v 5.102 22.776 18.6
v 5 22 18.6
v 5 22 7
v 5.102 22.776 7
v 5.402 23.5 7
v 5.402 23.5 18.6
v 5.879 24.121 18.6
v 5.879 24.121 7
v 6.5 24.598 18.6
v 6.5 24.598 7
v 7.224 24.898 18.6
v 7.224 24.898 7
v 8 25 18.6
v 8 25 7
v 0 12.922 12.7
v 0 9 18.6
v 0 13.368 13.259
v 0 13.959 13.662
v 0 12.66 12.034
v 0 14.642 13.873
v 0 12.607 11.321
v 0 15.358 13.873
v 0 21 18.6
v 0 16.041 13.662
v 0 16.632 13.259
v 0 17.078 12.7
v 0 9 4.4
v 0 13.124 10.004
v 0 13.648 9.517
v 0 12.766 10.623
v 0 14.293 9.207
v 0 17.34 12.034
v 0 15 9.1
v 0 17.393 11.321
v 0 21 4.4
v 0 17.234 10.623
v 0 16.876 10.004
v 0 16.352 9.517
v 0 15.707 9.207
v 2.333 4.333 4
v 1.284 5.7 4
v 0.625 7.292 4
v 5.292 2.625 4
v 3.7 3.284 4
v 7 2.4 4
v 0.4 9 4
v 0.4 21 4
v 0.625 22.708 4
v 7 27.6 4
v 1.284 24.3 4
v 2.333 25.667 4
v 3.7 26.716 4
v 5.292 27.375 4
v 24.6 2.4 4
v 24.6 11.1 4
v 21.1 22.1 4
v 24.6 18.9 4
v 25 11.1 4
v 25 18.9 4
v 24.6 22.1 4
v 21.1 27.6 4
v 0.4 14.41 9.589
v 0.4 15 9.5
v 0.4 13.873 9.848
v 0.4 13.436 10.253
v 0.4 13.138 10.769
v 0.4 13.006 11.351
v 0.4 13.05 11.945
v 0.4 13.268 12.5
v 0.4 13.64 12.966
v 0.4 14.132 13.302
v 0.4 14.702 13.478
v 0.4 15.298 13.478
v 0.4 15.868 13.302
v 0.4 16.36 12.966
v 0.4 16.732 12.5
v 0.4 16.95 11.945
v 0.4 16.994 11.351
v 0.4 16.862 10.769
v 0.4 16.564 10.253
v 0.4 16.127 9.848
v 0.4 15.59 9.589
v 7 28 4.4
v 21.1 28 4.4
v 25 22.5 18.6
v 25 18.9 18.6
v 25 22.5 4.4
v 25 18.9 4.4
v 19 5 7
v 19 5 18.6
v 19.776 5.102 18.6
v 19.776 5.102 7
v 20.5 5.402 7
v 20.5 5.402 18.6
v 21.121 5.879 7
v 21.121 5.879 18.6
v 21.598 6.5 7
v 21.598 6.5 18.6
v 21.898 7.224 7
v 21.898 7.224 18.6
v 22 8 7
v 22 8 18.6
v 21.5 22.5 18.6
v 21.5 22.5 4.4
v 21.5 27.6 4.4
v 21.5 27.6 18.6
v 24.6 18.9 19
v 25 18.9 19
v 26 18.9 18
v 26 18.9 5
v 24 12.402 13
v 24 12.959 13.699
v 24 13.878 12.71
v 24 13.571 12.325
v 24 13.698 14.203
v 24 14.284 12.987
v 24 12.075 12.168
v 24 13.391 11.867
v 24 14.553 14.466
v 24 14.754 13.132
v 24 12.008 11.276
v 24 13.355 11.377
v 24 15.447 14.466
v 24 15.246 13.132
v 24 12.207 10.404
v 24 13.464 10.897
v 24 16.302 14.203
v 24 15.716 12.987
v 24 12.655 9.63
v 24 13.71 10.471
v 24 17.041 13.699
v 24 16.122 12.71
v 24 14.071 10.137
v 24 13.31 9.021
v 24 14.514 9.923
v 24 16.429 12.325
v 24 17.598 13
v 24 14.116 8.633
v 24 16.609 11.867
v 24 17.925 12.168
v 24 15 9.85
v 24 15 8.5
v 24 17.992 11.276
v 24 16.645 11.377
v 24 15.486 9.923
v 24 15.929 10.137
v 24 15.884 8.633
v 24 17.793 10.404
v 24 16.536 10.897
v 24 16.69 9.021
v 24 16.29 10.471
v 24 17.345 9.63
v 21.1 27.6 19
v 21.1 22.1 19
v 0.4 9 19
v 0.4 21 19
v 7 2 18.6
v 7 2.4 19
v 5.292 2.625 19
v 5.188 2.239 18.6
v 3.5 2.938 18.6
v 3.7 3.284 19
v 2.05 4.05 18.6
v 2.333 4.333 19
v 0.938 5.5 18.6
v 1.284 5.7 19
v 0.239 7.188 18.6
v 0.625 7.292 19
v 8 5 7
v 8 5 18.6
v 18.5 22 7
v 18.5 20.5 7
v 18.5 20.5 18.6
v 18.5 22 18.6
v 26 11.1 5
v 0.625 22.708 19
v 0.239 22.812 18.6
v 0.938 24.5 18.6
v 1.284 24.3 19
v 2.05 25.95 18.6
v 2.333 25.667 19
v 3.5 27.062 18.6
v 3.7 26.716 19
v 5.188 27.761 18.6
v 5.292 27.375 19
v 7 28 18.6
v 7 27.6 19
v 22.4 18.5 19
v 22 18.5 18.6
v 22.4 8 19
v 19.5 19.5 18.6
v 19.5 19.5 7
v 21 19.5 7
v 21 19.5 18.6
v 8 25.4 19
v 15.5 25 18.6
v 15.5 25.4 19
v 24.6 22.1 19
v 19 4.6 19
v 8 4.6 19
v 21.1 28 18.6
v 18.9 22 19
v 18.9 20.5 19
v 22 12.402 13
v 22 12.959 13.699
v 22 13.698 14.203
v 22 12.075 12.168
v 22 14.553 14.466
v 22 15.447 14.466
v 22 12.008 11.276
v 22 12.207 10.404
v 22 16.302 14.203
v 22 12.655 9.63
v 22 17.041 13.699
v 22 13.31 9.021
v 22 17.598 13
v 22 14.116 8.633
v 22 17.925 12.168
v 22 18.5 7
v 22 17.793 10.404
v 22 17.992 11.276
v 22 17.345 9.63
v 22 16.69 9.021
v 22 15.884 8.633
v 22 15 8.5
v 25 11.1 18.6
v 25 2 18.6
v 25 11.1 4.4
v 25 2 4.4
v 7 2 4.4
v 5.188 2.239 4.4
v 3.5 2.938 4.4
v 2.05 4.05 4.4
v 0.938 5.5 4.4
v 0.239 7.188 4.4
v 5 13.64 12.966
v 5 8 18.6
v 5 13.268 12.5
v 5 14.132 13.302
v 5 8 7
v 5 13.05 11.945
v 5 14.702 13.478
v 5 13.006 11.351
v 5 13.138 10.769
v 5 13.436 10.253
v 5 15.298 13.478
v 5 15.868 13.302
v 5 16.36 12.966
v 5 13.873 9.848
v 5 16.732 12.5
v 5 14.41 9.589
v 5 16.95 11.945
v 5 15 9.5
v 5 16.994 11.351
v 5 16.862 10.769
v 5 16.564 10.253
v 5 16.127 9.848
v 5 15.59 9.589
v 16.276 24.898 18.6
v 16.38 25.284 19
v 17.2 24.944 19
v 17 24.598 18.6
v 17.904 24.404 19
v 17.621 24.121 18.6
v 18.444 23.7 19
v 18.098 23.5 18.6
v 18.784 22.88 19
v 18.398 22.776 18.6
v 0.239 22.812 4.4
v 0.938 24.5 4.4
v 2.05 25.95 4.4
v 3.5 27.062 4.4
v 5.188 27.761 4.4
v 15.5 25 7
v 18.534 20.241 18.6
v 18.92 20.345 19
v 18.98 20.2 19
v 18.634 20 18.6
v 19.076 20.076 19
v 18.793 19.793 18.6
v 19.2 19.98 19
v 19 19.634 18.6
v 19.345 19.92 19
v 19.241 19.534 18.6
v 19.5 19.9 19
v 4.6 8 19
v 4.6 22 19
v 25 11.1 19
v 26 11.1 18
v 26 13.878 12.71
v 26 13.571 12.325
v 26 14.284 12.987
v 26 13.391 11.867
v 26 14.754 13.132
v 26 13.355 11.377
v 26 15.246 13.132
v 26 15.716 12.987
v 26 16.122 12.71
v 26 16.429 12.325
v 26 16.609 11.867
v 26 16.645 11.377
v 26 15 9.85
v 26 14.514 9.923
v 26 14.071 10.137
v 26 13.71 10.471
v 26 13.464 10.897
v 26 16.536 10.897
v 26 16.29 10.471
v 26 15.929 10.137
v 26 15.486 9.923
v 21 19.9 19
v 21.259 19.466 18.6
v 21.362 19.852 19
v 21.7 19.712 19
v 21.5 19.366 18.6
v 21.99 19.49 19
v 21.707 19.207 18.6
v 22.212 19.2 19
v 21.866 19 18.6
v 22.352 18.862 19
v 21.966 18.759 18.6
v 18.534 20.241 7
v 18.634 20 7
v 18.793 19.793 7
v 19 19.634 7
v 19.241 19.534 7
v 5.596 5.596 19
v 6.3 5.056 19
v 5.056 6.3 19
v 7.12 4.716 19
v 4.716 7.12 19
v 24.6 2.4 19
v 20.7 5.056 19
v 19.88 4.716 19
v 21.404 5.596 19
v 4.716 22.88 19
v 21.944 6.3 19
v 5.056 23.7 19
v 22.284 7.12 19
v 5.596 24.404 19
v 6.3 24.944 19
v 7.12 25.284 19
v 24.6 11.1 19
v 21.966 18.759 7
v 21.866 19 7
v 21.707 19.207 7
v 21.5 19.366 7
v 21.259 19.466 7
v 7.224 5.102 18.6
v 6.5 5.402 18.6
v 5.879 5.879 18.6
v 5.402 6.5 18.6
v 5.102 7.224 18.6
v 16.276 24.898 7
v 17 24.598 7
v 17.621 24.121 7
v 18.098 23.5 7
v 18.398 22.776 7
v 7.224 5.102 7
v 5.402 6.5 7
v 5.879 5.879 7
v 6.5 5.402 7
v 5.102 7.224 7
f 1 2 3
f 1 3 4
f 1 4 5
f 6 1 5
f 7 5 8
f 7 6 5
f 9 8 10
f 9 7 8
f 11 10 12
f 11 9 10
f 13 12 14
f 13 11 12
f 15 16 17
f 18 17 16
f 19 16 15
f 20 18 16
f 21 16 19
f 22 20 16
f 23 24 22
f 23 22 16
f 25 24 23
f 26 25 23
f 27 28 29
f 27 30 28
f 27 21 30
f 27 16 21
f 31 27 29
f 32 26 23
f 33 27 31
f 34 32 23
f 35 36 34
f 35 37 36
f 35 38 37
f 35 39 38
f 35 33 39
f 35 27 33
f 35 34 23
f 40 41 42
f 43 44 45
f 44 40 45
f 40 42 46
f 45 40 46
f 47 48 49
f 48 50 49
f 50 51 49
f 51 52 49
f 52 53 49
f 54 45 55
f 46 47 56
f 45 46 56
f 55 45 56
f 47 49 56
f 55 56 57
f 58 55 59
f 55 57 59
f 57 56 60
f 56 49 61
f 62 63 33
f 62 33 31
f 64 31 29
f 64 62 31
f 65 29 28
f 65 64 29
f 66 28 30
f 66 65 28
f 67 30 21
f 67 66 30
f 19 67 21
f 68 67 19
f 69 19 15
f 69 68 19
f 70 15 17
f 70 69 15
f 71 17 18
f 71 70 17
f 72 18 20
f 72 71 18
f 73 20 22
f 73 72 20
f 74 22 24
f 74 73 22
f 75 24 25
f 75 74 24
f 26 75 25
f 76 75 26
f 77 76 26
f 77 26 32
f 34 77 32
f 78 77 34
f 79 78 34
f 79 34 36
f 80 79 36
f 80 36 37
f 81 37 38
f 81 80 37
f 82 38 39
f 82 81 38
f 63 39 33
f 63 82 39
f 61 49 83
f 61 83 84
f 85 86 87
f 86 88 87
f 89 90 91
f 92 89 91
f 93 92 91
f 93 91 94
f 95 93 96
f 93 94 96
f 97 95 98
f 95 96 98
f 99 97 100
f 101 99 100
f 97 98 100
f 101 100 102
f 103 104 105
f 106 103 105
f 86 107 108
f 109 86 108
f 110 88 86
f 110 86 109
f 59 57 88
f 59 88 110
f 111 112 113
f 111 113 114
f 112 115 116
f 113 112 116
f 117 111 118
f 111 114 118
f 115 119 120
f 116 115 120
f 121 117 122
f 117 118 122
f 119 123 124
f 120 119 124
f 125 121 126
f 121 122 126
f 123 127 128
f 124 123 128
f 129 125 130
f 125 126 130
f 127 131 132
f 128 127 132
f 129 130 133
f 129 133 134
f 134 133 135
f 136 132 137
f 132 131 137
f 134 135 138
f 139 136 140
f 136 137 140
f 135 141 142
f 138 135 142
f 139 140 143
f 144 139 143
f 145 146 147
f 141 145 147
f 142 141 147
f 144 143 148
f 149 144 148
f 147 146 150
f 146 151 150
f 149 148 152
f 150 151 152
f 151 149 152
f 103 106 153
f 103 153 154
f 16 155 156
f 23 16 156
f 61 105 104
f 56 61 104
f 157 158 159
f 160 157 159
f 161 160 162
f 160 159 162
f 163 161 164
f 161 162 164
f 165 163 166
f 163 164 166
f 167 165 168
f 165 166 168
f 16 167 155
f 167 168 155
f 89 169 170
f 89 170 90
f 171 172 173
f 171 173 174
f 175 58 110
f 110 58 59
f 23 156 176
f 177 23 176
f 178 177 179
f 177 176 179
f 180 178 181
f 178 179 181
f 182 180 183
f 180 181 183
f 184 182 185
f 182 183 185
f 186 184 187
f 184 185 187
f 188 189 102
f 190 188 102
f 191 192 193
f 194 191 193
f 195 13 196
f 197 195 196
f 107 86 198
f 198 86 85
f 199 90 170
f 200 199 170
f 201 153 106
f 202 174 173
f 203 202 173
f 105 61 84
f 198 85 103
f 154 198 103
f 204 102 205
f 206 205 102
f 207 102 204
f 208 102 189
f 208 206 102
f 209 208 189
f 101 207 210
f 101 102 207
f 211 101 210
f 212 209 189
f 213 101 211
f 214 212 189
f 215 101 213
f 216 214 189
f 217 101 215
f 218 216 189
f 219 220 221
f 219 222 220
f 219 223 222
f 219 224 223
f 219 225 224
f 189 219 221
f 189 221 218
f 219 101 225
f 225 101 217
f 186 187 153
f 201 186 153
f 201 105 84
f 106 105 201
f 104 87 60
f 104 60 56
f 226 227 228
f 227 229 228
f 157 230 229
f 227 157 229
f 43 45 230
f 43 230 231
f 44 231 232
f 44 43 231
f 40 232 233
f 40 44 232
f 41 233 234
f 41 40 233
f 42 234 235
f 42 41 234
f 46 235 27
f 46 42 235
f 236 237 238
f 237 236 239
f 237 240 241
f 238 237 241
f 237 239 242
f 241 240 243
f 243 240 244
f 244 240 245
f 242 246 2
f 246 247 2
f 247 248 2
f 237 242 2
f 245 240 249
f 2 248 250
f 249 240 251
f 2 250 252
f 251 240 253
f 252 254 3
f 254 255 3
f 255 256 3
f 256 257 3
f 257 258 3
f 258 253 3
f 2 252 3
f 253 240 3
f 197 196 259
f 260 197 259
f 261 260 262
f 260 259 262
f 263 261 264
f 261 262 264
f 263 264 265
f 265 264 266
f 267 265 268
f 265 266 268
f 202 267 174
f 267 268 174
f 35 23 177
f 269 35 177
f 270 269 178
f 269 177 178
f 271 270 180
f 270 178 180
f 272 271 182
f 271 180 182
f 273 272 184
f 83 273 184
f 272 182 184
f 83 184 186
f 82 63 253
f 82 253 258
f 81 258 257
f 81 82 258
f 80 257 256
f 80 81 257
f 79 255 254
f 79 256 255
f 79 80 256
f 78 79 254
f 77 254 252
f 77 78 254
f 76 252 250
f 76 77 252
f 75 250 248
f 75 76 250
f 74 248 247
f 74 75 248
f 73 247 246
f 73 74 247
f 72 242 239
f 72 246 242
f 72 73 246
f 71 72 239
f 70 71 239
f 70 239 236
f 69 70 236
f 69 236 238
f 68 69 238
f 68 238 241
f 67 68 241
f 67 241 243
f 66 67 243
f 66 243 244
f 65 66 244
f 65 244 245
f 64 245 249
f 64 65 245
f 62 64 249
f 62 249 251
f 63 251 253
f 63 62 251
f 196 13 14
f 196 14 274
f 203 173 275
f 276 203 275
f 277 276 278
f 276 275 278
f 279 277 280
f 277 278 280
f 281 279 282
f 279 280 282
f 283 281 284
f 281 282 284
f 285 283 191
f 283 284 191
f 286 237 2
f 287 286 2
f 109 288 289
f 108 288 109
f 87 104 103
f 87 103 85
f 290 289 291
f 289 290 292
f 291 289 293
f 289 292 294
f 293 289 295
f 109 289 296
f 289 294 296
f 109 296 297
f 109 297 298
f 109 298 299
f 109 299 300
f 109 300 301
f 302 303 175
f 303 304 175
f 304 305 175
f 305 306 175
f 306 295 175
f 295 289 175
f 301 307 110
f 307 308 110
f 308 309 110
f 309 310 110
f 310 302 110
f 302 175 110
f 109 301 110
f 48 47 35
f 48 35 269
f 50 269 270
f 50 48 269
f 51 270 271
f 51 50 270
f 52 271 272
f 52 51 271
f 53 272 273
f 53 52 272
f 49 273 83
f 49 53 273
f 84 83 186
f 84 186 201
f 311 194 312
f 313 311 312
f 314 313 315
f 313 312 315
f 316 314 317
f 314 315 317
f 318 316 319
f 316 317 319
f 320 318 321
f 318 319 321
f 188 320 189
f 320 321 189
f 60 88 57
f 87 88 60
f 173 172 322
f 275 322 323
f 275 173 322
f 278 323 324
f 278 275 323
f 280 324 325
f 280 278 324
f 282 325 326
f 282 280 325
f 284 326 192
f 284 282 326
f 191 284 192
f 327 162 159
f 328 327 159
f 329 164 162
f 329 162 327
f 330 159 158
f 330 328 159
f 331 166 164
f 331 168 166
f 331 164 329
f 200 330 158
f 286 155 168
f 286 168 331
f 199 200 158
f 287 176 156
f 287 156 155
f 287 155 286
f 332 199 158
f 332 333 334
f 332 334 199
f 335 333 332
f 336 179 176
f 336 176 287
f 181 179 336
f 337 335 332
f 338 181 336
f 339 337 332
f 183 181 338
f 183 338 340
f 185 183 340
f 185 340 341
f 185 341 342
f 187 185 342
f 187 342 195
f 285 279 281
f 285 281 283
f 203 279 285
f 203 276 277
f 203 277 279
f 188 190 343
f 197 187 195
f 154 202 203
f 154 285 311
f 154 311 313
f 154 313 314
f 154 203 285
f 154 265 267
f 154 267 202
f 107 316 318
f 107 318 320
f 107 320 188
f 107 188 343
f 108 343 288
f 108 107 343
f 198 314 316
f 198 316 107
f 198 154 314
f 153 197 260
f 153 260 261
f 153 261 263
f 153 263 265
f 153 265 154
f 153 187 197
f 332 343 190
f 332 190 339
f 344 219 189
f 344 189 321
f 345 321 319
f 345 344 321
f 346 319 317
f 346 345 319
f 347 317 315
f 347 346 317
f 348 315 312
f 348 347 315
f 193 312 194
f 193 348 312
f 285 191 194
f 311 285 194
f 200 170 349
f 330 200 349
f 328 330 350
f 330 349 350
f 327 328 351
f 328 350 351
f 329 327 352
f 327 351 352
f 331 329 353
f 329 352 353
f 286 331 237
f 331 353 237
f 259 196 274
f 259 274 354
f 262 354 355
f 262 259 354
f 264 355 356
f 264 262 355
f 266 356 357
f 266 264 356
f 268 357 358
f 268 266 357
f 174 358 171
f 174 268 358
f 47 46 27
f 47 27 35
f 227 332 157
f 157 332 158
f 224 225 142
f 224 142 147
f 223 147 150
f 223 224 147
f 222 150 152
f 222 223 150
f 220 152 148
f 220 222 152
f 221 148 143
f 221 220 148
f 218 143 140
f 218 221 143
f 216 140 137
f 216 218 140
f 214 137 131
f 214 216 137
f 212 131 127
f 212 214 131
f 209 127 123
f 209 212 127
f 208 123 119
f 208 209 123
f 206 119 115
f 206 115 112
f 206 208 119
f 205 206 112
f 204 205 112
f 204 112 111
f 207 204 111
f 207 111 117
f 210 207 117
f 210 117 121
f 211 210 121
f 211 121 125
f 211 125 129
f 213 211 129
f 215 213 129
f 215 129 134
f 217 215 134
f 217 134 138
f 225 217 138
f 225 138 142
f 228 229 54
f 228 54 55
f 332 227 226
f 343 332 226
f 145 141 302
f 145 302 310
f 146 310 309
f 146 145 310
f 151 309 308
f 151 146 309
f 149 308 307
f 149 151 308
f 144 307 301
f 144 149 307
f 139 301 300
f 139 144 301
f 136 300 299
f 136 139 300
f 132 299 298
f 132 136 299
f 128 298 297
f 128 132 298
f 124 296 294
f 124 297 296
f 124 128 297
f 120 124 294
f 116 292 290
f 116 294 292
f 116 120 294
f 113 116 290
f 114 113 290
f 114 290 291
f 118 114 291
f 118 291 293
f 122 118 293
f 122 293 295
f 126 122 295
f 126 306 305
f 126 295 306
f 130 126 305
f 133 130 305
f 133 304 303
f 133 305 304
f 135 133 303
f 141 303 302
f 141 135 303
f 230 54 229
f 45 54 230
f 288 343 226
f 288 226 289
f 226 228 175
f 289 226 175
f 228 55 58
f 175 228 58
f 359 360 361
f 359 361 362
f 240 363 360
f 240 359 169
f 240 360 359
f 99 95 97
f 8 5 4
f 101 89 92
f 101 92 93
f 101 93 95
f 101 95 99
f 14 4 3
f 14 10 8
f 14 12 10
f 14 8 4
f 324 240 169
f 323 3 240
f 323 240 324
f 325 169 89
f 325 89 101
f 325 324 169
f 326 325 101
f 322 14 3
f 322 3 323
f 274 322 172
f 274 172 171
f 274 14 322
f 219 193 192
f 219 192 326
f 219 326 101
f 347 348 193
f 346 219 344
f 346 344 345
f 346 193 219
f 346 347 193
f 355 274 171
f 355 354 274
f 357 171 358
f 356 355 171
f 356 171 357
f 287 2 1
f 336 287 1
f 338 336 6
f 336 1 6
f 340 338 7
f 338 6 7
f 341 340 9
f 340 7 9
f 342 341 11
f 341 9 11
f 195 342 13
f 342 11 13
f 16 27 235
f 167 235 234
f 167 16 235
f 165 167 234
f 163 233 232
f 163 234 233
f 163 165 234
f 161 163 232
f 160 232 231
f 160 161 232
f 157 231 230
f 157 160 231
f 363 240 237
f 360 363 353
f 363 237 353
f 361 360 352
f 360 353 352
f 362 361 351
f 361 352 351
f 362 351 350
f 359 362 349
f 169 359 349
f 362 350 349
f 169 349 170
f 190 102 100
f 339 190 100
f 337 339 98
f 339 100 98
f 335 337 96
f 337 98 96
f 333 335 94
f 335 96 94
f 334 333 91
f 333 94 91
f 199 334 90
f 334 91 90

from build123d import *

# Parameters (mm, degrees)
CYLINDER016027_R            = 3
CYLINDER016027_DEPTH        = 3
CYLINDER016026_R            = 1.65
CYLINDER016026_DEPTH        = 15
CYLINDER016025_R            = 2
CYLINDER016025_DEPTH        = 15
BOX031_W                    = 10
BOX031_H                    = 10
BOX031_DEPTH                = 42
BOX032_W                    = 10
BOX032_H                    = 10
BOX032_DEPTH                = 42
BOX029_W                    = 17
BOX029_H                    = 20
BOX029_DEPTH                = 32
FILLET007_R                 = 3
FILLET008_R                 = 1
BOX025_W                    = 25
BOX025_H                    = 26
BOX025_DEPTH                = 15
FILLET008003_R              = 7
CHAMFER016016008004014_SIZE = 0.4
BOX026_W                    = 2
BOX026_H                    = 7.8
BOX026_DEPTH                = 15
CHAMFER016016008004011_SIZE = 1
CHAMFER016016008004015_SIZE = 0.4


with BuildPart() as cylinder041:
    # Cylinder016027 → Cylinder016027 (new body)
    with BuildSketch(Plane(origin=(21, 15, 11.5), x_dir=(0, 0, -1), z_dir=(1, 0, 0))):
        Circle(CYLINDER016027_R)
    extrude(amount=CYLINDER016027_DEPTH)


with BuildPart() as cylinder040:
    # Cylinder016026 → Cylinder016026 (new body)
    with BuildSketch(Plane(origin=(20.5, 15, 11.5), x_dir=(0, 0, -1), z_dir=(1, 0, 0))):
        Circle(CYLINDER016026_R)
    extrude(amount=CYLINDER016026_DEPTH)


with BuildPart() as cylinder039:
    # Cylinder016025 → Cylinder016025 (new body)
    with BuildSketch(Plane(origin=(-2, 15, 11.5), x_dir=(0, 0, -1), z_dir=(1, 0, 0))):
        Circle(CYLINDER016025_R)
    extrude(amount=CYLINDER016025_DEPTH)


with BuildPart() as cube031:
    # Box031 → Box031 (new body)
    with BuildSketch(Plane(origin=(21.5, 22.5, 0), x_dir=(1, 0, 0), z_dir=(0, 0, 1))):
        with Locations((5, 5)):
            Rectangle(BOX031_W, BOX031_H)
    extrude(amount=BOX031_DEPTH)


with BuildPart() as cube032:
    # Box032 → Box032 (new body)
    with BuildSketch(Plane(origin=(18.5, 19.5, 0), x_dir=(1, 0, 0), z_dir=(0, 0, 1))):
        with Locations((5, 5)):
            Rectangle(BOX032_W, BOX032_H)
    extrude(amount=BOX032_DEPTH)


with BuildPart() as inner_cut:
    # Box029 → Box029 (new body)
    with BuildSketch(Plane(origin=(5, 5, 4), x_dir=(1, 0, 0), z_dir=(0, 0, 1))):
        with Locations((8.5, 10)):
            Rectangle(BOX029_W, BOX029_H)
    extrude(amount=BOX029_DEPTH)

    # Cut010011008009003005: cut Cube032
    add(cube032.part, mode=Mode.SUBTRACT)

    # Fillet007
    fillet007_edges = [inner_cut.edges().sort_by_distance(p)[0] for p in [
        (5, 5, 20),
        (5, 25, 20),
        (22, 5, 20),
        (18.5, 25, 20),
    ]]
    fillet(fillet007_edges, radius=FILLET007_R)

    # Fillet008
    fillet008_edges = [inner_cut.edges().sort_by_distance(p)[0] for p in [
        (18.5, 19.5, 20),
        (22, 19.5, 20),
    ]]
    fillet(fillet008_edges, radius=FILLET008_R)


with BuildPart() as inner_cut_1:
    # Fillet008 placement: moved
    add(inner_cut.part.moved(Location((0, 0, 3))))


with BuildPart() as chamfer016016008004014:
    # Box025 → Box025 (new body)
    with BuildSketch(Plane(origin=(0, 2, 4), x_dir=(1, 0, 0), z_dir=(0, 0, 1))):
        with Locations((12.5, 13)):
            Rectangle(BOX025_W, BOX025_H)
    extrude(amount=BOX025_DEPTH)

    # Cut010011008009003009: cut inner-cut
    add(inner_cut_1.part, mode=Mode.SUBTRACT)

    # Fillet008003
    fillet008003_edges = [chamfer016016008004014.edges().sort_by_distance(p)[0] for p in [
        (0, 2, 11.5),
        (0, 28, 11.5),
    ]]
    fillet(fillet008003_edges, radius=FILLET008003_R)

    # Cut010011008009003010: cut Cube031
    add(cube031.part, mode=Mode.SUBTRACT)

    # Chamfer016016008004014
    chamfer016016008004014_edges = [chamfer016016008004014.edges().sort_by_distance(p)[0] for p in [
        (0, 15, 19),
        (0, 15, 4),
        (2.050253, 25.949747, 19),
        (14.25, 28, 19),
        (21.5, 25.25, 19),
        (23.25, 22.5, 19),
        (25, 12.25, 19),
        (16, 2, 19),
        (2.050253, 4.050253, 19),
        (18.5, 21.25, 19),
        (18.792893, 19.792893, 19),
        (17.62132, 24.12132, 19),
        (20.25, 19.5, 19),
        (11.75, 25, 19),
        (21.707107, 19.207107, 19),
        (5.87868, 24.12132, 19),
        (22, 13.25, 19),
        (5, 15, 19),
        (21.12132, 5.87868, 19),
        (5.87868, 5.87868, 19),
        (13.5, 5, 19),
        (2.050253, 4.050253, 4),
        (2.050253, 25.949747, 4),
        (14.25, 28, 4),
        (21.5, 25.25, 4),
        (23.25, 22.5, 4),
        (25, 12.25, 4),
        (16, 2, 4),
        (21.5, 28, 11.5),
    ]]
    chamfer(chamfer016016008004014_edges, length=CHAMFER016016008004014_SIZE)


with BuildPart() as tweezer_holder_btm:
    # Box026 → Box026 (new body)
    with BuildSketch(Plane(origin=(24, 11.1, 4), x_dir=(1, 0, 0), z_dir=(0, 0, 1))):
        with Locations((1, 3.9)):
            Rectangle(BOX026_W, BOX026_H)
    extrude(amount=BOX026_DEPTH)

    # Chamfer016016008004011
    chamfer016016008004011_edges = [tweezer_holder_btm.edges().sort_by_distance(p)[0] for p in [
        (26, 15, 19),
        (26, 15, 4),
    ]]
    chamfer(chamfer016016008004011_edges, length=CHAMFER016016008004011_SIZE)

    # Fusion018007003006: union Chamfer016016008004014
    add(chamfer016016008004014.part)

    # Cut010011008009003011: cut Cylinder039
    add(cylinder039.part, mode=Mode.SUBTRACT)

    # Chamfer016016008004015
    chamfer016016008004015_edges = [tweezer_holder_btm.edges().sort_by_distance(p)[0] for p in [
        (0, 15, 13.5),
    ]]
    chamfer(chamfer016016008004015_edges, length=CHAMFER016016008004015_SIZE)

    # Cut010011008009003012: cut Cylinder040
    add(cylinder040.part, mode=Mode.SUBTRACT)

    # Cut010011008009003013: cut Cylinder041
    add(cylinder041.part, mode=Mode.SUBTRACT)


solid = tweezer_holder_btm.part
